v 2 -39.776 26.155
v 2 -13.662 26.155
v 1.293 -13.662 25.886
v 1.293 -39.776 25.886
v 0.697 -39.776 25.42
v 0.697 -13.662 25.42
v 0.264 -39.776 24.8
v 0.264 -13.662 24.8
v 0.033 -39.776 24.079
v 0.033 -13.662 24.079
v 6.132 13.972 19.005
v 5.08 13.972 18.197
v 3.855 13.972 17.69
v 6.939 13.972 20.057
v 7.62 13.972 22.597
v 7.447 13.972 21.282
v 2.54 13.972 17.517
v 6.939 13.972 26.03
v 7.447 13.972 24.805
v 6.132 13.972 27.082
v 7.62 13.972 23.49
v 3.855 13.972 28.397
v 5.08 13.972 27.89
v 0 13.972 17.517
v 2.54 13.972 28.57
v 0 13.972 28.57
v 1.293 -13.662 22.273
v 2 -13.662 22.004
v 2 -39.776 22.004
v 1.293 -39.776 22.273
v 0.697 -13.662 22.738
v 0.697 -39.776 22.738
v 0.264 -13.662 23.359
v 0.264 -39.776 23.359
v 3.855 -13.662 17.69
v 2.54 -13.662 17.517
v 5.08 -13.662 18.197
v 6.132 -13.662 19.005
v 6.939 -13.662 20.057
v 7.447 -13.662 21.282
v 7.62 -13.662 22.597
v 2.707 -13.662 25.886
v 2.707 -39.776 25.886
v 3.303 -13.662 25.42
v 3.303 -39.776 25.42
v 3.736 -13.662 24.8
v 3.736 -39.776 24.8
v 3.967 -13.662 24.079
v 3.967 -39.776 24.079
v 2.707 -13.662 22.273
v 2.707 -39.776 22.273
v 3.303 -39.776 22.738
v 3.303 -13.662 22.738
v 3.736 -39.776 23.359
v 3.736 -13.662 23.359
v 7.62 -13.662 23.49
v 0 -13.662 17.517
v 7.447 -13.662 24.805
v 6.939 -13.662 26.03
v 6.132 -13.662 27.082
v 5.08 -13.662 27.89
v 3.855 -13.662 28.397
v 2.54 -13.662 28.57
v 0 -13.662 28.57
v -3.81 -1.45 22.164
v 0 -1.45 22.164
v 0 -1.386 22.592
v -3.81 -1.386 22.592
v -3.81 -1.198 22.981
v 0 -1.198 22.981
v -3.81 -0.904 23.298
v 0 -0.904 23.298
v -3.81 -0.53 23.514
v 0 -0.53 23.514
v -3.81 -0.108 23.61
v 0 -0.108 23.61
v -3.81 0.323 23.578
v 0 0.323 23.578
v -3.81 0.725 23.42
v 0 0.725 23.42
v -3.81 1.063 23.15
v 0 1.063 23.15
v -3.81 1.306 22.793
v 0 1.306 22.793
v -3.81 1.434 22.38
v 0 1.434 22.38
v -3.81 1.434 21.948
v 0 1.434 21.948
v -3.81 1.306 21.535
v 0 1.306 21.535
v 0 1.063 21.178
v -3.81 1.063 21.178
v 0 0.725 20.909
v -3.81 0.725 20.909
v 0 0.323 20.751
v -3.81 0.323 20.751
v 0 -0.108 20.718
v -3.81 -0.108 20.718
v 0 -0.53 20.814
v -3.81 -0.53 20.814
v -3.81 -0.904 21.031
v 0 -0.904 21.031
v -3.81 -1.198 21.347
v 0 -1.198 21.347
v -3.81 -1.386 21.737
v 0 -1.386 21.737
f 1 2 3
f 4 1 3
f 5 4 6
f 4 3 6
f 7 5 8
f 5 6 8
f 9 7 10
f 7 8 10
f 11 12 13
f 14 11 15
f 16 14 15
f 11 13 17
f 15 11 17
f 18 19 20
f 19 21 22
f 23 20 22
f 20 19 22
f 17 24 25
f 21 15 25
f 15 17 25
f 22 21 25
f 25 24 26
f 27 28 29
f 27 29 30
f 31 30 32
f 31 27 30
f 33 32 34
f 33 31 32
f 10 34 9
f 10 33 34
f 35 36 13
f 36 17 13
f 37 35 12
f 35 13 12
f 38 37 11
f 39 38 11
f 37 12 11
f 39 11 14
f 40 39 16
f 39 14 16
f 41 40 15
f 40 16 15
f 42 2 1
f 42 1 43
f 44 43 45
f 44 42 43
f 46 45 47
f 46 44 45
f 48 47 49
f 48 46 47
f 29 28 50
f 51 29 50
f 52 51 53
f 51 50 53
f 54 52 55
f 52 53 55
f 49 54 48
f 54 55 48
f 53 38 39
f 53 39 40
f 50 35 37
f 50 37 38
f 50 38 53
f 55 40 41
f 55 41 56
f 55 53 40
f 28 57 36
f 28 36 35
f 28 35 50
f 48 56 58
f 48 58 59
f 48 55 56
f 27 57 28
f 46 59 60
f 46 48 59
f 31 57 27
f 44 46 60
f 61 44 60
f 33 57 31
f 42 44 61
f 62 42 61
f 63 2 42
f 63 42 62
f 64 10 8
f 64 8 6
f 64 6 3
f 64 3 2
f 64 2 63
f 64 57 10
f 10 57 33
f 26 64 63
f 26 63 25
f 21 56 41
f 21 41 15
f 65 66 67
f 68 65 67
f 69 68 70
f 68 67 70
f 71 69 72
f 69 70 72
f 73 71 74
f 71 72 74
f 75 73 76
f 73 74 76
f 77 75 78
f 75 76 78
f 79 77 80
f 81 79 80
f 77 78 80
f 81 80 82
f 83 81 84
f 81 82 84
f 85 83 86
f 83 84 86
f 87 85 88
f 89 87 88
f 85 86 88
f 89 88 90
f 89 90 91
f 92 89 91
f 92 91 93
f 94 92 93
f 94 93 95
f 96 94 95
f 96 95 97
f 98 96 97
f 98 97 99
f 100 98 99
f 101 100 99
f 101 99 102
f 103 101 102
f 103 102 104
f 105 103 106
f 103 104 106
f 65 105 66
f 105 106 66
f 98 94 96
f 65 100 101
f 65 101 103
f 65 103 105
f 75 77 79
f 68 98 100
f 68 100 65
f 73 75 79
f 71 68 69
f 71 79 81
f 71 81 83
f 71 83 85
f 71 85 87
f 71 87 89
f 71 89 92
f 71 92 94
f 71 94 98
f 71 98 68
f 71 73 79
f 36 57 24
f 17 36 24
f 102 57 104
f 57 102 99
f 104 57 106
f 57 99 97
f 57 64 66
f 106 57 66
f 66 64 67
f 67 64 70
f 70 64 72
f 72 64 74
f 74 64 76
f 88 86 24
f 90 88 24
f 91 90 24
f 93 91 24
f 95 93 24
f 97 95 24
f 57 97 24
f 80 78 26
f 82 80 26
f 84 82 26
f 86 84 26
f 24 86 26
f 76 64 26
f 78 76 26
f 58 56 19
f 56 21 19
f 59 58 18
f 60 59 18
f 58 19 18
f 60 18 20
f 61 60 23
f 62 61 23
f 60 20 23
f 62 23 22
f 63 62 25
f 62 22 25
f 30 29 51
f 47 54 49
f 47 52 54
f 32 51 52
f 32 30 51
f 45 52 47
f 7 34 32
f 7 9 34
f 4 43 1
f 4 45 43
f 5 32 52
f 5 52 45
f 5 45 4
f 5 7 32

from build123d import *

# Parameters (mm, degrees)
F0_W        = 39.7763997316
F0_H        = 4.2672008276
F1_DEPTH    = 4
F2_T1_DEPTH = 52.4763997316
F3_W        = 27.6340441778
F3_H        = 11.0536180437
F4_DEPTH    = 7.62
F5_R        = 5.08
F6_R        = 1.45
F7_DEPTH    = 3.81


# Not quite as in the source:
# - a fillet or chamfer that OpenCascade refuses, or shapes differently, is made with other operations: its cross-section is extruded or revolved along the edge and cut away or added


with BuildPart() as f1:
    # F0 (on Right) → F1 (new body)
    with BuildSketch(Plane.YZ):
        with Locations((-19.8881998658, 24.0791998804)):
            Rectangle(F0_W, F0_H)
    extrude(amount=F1_DEPTH)

    # F2: fillet of radius 2.54 on 4 edges, made by hand

    # F2_s2 → F2_t1 (cut)
    with BuildSketch(Plane.XZ.offset(-6.35)):
        with BuildLine():
            ThreePointArc((1.46, 26.2128002942), (3.2560512242, 25.4688515184), (4, 23.6728002942))
            Line((4, 23.6728002942), (4, 26.2128002942))
            Line((4, 26.2128002942), (1.46, 26.2128002942))
        make_face()
        with BuildLine():
            ThreePointArc((2.54, 26.2128002942), (0.7439487758, 25.4688515184), (0, 23.6728002942))
            Line((0, 23.6728002942), (0, 26.2128002942))
            Line((0, 26.2128002942), (2.54, 26.2128002942))
        make_face()
        with BuildLine():
            ThreePointArc((1.46, 21.9455994666), (3.2560512242, 22.6895482423), (4, 24.4855994666))
            Line((4, 24.4855994666), (4, 21.9455994666))
            Line((4, 21.9455994666), (1.46, 21.9455994666))
        make_face()
        with BuildLine():
            ThreePointArc((2.54, 21.9455994666), (0.7439487758, 22.6895482423), (0, 24.4855994666))
            Line((0, 24.4855994666), (0, 21.9455994666))
            Line((0, 21.9455994666), (2.54, 21.9455994666))
        make_face()
    extrude(amount=F2_T1_DEPTH, mode=Mode.SUBTRACT)

    # F3 (on Right) → F4 (join)
    with BuildSketch(Plane.YZ):
        with Locations((0.1553441398, 23.0435747653)):
            Rectangle(F3_W, F3_H)
    extrude(amount=F4_DEPTH)

    # F5
    f5_edges = [f1.edges().sort_by_distance(p)[0] for p in [
        (7.62, 0.155344, 28.570384),
        (7.62, 0.155344, 17.516766),
    ]]
    fillet(f5_edges, radius=F5_R)

    # F6 (on face) → F7 (join)
    with BuildSketch(Plane(origin=(0, 0, 0), x_dir=(0, -1, 0), z_dir=(-1, 0, 0))):
        with Locations((0, 22.1642478059)):
            Circle(F6_R)
    extrude(amount=F7_DEPTH)


solid = f1.part
